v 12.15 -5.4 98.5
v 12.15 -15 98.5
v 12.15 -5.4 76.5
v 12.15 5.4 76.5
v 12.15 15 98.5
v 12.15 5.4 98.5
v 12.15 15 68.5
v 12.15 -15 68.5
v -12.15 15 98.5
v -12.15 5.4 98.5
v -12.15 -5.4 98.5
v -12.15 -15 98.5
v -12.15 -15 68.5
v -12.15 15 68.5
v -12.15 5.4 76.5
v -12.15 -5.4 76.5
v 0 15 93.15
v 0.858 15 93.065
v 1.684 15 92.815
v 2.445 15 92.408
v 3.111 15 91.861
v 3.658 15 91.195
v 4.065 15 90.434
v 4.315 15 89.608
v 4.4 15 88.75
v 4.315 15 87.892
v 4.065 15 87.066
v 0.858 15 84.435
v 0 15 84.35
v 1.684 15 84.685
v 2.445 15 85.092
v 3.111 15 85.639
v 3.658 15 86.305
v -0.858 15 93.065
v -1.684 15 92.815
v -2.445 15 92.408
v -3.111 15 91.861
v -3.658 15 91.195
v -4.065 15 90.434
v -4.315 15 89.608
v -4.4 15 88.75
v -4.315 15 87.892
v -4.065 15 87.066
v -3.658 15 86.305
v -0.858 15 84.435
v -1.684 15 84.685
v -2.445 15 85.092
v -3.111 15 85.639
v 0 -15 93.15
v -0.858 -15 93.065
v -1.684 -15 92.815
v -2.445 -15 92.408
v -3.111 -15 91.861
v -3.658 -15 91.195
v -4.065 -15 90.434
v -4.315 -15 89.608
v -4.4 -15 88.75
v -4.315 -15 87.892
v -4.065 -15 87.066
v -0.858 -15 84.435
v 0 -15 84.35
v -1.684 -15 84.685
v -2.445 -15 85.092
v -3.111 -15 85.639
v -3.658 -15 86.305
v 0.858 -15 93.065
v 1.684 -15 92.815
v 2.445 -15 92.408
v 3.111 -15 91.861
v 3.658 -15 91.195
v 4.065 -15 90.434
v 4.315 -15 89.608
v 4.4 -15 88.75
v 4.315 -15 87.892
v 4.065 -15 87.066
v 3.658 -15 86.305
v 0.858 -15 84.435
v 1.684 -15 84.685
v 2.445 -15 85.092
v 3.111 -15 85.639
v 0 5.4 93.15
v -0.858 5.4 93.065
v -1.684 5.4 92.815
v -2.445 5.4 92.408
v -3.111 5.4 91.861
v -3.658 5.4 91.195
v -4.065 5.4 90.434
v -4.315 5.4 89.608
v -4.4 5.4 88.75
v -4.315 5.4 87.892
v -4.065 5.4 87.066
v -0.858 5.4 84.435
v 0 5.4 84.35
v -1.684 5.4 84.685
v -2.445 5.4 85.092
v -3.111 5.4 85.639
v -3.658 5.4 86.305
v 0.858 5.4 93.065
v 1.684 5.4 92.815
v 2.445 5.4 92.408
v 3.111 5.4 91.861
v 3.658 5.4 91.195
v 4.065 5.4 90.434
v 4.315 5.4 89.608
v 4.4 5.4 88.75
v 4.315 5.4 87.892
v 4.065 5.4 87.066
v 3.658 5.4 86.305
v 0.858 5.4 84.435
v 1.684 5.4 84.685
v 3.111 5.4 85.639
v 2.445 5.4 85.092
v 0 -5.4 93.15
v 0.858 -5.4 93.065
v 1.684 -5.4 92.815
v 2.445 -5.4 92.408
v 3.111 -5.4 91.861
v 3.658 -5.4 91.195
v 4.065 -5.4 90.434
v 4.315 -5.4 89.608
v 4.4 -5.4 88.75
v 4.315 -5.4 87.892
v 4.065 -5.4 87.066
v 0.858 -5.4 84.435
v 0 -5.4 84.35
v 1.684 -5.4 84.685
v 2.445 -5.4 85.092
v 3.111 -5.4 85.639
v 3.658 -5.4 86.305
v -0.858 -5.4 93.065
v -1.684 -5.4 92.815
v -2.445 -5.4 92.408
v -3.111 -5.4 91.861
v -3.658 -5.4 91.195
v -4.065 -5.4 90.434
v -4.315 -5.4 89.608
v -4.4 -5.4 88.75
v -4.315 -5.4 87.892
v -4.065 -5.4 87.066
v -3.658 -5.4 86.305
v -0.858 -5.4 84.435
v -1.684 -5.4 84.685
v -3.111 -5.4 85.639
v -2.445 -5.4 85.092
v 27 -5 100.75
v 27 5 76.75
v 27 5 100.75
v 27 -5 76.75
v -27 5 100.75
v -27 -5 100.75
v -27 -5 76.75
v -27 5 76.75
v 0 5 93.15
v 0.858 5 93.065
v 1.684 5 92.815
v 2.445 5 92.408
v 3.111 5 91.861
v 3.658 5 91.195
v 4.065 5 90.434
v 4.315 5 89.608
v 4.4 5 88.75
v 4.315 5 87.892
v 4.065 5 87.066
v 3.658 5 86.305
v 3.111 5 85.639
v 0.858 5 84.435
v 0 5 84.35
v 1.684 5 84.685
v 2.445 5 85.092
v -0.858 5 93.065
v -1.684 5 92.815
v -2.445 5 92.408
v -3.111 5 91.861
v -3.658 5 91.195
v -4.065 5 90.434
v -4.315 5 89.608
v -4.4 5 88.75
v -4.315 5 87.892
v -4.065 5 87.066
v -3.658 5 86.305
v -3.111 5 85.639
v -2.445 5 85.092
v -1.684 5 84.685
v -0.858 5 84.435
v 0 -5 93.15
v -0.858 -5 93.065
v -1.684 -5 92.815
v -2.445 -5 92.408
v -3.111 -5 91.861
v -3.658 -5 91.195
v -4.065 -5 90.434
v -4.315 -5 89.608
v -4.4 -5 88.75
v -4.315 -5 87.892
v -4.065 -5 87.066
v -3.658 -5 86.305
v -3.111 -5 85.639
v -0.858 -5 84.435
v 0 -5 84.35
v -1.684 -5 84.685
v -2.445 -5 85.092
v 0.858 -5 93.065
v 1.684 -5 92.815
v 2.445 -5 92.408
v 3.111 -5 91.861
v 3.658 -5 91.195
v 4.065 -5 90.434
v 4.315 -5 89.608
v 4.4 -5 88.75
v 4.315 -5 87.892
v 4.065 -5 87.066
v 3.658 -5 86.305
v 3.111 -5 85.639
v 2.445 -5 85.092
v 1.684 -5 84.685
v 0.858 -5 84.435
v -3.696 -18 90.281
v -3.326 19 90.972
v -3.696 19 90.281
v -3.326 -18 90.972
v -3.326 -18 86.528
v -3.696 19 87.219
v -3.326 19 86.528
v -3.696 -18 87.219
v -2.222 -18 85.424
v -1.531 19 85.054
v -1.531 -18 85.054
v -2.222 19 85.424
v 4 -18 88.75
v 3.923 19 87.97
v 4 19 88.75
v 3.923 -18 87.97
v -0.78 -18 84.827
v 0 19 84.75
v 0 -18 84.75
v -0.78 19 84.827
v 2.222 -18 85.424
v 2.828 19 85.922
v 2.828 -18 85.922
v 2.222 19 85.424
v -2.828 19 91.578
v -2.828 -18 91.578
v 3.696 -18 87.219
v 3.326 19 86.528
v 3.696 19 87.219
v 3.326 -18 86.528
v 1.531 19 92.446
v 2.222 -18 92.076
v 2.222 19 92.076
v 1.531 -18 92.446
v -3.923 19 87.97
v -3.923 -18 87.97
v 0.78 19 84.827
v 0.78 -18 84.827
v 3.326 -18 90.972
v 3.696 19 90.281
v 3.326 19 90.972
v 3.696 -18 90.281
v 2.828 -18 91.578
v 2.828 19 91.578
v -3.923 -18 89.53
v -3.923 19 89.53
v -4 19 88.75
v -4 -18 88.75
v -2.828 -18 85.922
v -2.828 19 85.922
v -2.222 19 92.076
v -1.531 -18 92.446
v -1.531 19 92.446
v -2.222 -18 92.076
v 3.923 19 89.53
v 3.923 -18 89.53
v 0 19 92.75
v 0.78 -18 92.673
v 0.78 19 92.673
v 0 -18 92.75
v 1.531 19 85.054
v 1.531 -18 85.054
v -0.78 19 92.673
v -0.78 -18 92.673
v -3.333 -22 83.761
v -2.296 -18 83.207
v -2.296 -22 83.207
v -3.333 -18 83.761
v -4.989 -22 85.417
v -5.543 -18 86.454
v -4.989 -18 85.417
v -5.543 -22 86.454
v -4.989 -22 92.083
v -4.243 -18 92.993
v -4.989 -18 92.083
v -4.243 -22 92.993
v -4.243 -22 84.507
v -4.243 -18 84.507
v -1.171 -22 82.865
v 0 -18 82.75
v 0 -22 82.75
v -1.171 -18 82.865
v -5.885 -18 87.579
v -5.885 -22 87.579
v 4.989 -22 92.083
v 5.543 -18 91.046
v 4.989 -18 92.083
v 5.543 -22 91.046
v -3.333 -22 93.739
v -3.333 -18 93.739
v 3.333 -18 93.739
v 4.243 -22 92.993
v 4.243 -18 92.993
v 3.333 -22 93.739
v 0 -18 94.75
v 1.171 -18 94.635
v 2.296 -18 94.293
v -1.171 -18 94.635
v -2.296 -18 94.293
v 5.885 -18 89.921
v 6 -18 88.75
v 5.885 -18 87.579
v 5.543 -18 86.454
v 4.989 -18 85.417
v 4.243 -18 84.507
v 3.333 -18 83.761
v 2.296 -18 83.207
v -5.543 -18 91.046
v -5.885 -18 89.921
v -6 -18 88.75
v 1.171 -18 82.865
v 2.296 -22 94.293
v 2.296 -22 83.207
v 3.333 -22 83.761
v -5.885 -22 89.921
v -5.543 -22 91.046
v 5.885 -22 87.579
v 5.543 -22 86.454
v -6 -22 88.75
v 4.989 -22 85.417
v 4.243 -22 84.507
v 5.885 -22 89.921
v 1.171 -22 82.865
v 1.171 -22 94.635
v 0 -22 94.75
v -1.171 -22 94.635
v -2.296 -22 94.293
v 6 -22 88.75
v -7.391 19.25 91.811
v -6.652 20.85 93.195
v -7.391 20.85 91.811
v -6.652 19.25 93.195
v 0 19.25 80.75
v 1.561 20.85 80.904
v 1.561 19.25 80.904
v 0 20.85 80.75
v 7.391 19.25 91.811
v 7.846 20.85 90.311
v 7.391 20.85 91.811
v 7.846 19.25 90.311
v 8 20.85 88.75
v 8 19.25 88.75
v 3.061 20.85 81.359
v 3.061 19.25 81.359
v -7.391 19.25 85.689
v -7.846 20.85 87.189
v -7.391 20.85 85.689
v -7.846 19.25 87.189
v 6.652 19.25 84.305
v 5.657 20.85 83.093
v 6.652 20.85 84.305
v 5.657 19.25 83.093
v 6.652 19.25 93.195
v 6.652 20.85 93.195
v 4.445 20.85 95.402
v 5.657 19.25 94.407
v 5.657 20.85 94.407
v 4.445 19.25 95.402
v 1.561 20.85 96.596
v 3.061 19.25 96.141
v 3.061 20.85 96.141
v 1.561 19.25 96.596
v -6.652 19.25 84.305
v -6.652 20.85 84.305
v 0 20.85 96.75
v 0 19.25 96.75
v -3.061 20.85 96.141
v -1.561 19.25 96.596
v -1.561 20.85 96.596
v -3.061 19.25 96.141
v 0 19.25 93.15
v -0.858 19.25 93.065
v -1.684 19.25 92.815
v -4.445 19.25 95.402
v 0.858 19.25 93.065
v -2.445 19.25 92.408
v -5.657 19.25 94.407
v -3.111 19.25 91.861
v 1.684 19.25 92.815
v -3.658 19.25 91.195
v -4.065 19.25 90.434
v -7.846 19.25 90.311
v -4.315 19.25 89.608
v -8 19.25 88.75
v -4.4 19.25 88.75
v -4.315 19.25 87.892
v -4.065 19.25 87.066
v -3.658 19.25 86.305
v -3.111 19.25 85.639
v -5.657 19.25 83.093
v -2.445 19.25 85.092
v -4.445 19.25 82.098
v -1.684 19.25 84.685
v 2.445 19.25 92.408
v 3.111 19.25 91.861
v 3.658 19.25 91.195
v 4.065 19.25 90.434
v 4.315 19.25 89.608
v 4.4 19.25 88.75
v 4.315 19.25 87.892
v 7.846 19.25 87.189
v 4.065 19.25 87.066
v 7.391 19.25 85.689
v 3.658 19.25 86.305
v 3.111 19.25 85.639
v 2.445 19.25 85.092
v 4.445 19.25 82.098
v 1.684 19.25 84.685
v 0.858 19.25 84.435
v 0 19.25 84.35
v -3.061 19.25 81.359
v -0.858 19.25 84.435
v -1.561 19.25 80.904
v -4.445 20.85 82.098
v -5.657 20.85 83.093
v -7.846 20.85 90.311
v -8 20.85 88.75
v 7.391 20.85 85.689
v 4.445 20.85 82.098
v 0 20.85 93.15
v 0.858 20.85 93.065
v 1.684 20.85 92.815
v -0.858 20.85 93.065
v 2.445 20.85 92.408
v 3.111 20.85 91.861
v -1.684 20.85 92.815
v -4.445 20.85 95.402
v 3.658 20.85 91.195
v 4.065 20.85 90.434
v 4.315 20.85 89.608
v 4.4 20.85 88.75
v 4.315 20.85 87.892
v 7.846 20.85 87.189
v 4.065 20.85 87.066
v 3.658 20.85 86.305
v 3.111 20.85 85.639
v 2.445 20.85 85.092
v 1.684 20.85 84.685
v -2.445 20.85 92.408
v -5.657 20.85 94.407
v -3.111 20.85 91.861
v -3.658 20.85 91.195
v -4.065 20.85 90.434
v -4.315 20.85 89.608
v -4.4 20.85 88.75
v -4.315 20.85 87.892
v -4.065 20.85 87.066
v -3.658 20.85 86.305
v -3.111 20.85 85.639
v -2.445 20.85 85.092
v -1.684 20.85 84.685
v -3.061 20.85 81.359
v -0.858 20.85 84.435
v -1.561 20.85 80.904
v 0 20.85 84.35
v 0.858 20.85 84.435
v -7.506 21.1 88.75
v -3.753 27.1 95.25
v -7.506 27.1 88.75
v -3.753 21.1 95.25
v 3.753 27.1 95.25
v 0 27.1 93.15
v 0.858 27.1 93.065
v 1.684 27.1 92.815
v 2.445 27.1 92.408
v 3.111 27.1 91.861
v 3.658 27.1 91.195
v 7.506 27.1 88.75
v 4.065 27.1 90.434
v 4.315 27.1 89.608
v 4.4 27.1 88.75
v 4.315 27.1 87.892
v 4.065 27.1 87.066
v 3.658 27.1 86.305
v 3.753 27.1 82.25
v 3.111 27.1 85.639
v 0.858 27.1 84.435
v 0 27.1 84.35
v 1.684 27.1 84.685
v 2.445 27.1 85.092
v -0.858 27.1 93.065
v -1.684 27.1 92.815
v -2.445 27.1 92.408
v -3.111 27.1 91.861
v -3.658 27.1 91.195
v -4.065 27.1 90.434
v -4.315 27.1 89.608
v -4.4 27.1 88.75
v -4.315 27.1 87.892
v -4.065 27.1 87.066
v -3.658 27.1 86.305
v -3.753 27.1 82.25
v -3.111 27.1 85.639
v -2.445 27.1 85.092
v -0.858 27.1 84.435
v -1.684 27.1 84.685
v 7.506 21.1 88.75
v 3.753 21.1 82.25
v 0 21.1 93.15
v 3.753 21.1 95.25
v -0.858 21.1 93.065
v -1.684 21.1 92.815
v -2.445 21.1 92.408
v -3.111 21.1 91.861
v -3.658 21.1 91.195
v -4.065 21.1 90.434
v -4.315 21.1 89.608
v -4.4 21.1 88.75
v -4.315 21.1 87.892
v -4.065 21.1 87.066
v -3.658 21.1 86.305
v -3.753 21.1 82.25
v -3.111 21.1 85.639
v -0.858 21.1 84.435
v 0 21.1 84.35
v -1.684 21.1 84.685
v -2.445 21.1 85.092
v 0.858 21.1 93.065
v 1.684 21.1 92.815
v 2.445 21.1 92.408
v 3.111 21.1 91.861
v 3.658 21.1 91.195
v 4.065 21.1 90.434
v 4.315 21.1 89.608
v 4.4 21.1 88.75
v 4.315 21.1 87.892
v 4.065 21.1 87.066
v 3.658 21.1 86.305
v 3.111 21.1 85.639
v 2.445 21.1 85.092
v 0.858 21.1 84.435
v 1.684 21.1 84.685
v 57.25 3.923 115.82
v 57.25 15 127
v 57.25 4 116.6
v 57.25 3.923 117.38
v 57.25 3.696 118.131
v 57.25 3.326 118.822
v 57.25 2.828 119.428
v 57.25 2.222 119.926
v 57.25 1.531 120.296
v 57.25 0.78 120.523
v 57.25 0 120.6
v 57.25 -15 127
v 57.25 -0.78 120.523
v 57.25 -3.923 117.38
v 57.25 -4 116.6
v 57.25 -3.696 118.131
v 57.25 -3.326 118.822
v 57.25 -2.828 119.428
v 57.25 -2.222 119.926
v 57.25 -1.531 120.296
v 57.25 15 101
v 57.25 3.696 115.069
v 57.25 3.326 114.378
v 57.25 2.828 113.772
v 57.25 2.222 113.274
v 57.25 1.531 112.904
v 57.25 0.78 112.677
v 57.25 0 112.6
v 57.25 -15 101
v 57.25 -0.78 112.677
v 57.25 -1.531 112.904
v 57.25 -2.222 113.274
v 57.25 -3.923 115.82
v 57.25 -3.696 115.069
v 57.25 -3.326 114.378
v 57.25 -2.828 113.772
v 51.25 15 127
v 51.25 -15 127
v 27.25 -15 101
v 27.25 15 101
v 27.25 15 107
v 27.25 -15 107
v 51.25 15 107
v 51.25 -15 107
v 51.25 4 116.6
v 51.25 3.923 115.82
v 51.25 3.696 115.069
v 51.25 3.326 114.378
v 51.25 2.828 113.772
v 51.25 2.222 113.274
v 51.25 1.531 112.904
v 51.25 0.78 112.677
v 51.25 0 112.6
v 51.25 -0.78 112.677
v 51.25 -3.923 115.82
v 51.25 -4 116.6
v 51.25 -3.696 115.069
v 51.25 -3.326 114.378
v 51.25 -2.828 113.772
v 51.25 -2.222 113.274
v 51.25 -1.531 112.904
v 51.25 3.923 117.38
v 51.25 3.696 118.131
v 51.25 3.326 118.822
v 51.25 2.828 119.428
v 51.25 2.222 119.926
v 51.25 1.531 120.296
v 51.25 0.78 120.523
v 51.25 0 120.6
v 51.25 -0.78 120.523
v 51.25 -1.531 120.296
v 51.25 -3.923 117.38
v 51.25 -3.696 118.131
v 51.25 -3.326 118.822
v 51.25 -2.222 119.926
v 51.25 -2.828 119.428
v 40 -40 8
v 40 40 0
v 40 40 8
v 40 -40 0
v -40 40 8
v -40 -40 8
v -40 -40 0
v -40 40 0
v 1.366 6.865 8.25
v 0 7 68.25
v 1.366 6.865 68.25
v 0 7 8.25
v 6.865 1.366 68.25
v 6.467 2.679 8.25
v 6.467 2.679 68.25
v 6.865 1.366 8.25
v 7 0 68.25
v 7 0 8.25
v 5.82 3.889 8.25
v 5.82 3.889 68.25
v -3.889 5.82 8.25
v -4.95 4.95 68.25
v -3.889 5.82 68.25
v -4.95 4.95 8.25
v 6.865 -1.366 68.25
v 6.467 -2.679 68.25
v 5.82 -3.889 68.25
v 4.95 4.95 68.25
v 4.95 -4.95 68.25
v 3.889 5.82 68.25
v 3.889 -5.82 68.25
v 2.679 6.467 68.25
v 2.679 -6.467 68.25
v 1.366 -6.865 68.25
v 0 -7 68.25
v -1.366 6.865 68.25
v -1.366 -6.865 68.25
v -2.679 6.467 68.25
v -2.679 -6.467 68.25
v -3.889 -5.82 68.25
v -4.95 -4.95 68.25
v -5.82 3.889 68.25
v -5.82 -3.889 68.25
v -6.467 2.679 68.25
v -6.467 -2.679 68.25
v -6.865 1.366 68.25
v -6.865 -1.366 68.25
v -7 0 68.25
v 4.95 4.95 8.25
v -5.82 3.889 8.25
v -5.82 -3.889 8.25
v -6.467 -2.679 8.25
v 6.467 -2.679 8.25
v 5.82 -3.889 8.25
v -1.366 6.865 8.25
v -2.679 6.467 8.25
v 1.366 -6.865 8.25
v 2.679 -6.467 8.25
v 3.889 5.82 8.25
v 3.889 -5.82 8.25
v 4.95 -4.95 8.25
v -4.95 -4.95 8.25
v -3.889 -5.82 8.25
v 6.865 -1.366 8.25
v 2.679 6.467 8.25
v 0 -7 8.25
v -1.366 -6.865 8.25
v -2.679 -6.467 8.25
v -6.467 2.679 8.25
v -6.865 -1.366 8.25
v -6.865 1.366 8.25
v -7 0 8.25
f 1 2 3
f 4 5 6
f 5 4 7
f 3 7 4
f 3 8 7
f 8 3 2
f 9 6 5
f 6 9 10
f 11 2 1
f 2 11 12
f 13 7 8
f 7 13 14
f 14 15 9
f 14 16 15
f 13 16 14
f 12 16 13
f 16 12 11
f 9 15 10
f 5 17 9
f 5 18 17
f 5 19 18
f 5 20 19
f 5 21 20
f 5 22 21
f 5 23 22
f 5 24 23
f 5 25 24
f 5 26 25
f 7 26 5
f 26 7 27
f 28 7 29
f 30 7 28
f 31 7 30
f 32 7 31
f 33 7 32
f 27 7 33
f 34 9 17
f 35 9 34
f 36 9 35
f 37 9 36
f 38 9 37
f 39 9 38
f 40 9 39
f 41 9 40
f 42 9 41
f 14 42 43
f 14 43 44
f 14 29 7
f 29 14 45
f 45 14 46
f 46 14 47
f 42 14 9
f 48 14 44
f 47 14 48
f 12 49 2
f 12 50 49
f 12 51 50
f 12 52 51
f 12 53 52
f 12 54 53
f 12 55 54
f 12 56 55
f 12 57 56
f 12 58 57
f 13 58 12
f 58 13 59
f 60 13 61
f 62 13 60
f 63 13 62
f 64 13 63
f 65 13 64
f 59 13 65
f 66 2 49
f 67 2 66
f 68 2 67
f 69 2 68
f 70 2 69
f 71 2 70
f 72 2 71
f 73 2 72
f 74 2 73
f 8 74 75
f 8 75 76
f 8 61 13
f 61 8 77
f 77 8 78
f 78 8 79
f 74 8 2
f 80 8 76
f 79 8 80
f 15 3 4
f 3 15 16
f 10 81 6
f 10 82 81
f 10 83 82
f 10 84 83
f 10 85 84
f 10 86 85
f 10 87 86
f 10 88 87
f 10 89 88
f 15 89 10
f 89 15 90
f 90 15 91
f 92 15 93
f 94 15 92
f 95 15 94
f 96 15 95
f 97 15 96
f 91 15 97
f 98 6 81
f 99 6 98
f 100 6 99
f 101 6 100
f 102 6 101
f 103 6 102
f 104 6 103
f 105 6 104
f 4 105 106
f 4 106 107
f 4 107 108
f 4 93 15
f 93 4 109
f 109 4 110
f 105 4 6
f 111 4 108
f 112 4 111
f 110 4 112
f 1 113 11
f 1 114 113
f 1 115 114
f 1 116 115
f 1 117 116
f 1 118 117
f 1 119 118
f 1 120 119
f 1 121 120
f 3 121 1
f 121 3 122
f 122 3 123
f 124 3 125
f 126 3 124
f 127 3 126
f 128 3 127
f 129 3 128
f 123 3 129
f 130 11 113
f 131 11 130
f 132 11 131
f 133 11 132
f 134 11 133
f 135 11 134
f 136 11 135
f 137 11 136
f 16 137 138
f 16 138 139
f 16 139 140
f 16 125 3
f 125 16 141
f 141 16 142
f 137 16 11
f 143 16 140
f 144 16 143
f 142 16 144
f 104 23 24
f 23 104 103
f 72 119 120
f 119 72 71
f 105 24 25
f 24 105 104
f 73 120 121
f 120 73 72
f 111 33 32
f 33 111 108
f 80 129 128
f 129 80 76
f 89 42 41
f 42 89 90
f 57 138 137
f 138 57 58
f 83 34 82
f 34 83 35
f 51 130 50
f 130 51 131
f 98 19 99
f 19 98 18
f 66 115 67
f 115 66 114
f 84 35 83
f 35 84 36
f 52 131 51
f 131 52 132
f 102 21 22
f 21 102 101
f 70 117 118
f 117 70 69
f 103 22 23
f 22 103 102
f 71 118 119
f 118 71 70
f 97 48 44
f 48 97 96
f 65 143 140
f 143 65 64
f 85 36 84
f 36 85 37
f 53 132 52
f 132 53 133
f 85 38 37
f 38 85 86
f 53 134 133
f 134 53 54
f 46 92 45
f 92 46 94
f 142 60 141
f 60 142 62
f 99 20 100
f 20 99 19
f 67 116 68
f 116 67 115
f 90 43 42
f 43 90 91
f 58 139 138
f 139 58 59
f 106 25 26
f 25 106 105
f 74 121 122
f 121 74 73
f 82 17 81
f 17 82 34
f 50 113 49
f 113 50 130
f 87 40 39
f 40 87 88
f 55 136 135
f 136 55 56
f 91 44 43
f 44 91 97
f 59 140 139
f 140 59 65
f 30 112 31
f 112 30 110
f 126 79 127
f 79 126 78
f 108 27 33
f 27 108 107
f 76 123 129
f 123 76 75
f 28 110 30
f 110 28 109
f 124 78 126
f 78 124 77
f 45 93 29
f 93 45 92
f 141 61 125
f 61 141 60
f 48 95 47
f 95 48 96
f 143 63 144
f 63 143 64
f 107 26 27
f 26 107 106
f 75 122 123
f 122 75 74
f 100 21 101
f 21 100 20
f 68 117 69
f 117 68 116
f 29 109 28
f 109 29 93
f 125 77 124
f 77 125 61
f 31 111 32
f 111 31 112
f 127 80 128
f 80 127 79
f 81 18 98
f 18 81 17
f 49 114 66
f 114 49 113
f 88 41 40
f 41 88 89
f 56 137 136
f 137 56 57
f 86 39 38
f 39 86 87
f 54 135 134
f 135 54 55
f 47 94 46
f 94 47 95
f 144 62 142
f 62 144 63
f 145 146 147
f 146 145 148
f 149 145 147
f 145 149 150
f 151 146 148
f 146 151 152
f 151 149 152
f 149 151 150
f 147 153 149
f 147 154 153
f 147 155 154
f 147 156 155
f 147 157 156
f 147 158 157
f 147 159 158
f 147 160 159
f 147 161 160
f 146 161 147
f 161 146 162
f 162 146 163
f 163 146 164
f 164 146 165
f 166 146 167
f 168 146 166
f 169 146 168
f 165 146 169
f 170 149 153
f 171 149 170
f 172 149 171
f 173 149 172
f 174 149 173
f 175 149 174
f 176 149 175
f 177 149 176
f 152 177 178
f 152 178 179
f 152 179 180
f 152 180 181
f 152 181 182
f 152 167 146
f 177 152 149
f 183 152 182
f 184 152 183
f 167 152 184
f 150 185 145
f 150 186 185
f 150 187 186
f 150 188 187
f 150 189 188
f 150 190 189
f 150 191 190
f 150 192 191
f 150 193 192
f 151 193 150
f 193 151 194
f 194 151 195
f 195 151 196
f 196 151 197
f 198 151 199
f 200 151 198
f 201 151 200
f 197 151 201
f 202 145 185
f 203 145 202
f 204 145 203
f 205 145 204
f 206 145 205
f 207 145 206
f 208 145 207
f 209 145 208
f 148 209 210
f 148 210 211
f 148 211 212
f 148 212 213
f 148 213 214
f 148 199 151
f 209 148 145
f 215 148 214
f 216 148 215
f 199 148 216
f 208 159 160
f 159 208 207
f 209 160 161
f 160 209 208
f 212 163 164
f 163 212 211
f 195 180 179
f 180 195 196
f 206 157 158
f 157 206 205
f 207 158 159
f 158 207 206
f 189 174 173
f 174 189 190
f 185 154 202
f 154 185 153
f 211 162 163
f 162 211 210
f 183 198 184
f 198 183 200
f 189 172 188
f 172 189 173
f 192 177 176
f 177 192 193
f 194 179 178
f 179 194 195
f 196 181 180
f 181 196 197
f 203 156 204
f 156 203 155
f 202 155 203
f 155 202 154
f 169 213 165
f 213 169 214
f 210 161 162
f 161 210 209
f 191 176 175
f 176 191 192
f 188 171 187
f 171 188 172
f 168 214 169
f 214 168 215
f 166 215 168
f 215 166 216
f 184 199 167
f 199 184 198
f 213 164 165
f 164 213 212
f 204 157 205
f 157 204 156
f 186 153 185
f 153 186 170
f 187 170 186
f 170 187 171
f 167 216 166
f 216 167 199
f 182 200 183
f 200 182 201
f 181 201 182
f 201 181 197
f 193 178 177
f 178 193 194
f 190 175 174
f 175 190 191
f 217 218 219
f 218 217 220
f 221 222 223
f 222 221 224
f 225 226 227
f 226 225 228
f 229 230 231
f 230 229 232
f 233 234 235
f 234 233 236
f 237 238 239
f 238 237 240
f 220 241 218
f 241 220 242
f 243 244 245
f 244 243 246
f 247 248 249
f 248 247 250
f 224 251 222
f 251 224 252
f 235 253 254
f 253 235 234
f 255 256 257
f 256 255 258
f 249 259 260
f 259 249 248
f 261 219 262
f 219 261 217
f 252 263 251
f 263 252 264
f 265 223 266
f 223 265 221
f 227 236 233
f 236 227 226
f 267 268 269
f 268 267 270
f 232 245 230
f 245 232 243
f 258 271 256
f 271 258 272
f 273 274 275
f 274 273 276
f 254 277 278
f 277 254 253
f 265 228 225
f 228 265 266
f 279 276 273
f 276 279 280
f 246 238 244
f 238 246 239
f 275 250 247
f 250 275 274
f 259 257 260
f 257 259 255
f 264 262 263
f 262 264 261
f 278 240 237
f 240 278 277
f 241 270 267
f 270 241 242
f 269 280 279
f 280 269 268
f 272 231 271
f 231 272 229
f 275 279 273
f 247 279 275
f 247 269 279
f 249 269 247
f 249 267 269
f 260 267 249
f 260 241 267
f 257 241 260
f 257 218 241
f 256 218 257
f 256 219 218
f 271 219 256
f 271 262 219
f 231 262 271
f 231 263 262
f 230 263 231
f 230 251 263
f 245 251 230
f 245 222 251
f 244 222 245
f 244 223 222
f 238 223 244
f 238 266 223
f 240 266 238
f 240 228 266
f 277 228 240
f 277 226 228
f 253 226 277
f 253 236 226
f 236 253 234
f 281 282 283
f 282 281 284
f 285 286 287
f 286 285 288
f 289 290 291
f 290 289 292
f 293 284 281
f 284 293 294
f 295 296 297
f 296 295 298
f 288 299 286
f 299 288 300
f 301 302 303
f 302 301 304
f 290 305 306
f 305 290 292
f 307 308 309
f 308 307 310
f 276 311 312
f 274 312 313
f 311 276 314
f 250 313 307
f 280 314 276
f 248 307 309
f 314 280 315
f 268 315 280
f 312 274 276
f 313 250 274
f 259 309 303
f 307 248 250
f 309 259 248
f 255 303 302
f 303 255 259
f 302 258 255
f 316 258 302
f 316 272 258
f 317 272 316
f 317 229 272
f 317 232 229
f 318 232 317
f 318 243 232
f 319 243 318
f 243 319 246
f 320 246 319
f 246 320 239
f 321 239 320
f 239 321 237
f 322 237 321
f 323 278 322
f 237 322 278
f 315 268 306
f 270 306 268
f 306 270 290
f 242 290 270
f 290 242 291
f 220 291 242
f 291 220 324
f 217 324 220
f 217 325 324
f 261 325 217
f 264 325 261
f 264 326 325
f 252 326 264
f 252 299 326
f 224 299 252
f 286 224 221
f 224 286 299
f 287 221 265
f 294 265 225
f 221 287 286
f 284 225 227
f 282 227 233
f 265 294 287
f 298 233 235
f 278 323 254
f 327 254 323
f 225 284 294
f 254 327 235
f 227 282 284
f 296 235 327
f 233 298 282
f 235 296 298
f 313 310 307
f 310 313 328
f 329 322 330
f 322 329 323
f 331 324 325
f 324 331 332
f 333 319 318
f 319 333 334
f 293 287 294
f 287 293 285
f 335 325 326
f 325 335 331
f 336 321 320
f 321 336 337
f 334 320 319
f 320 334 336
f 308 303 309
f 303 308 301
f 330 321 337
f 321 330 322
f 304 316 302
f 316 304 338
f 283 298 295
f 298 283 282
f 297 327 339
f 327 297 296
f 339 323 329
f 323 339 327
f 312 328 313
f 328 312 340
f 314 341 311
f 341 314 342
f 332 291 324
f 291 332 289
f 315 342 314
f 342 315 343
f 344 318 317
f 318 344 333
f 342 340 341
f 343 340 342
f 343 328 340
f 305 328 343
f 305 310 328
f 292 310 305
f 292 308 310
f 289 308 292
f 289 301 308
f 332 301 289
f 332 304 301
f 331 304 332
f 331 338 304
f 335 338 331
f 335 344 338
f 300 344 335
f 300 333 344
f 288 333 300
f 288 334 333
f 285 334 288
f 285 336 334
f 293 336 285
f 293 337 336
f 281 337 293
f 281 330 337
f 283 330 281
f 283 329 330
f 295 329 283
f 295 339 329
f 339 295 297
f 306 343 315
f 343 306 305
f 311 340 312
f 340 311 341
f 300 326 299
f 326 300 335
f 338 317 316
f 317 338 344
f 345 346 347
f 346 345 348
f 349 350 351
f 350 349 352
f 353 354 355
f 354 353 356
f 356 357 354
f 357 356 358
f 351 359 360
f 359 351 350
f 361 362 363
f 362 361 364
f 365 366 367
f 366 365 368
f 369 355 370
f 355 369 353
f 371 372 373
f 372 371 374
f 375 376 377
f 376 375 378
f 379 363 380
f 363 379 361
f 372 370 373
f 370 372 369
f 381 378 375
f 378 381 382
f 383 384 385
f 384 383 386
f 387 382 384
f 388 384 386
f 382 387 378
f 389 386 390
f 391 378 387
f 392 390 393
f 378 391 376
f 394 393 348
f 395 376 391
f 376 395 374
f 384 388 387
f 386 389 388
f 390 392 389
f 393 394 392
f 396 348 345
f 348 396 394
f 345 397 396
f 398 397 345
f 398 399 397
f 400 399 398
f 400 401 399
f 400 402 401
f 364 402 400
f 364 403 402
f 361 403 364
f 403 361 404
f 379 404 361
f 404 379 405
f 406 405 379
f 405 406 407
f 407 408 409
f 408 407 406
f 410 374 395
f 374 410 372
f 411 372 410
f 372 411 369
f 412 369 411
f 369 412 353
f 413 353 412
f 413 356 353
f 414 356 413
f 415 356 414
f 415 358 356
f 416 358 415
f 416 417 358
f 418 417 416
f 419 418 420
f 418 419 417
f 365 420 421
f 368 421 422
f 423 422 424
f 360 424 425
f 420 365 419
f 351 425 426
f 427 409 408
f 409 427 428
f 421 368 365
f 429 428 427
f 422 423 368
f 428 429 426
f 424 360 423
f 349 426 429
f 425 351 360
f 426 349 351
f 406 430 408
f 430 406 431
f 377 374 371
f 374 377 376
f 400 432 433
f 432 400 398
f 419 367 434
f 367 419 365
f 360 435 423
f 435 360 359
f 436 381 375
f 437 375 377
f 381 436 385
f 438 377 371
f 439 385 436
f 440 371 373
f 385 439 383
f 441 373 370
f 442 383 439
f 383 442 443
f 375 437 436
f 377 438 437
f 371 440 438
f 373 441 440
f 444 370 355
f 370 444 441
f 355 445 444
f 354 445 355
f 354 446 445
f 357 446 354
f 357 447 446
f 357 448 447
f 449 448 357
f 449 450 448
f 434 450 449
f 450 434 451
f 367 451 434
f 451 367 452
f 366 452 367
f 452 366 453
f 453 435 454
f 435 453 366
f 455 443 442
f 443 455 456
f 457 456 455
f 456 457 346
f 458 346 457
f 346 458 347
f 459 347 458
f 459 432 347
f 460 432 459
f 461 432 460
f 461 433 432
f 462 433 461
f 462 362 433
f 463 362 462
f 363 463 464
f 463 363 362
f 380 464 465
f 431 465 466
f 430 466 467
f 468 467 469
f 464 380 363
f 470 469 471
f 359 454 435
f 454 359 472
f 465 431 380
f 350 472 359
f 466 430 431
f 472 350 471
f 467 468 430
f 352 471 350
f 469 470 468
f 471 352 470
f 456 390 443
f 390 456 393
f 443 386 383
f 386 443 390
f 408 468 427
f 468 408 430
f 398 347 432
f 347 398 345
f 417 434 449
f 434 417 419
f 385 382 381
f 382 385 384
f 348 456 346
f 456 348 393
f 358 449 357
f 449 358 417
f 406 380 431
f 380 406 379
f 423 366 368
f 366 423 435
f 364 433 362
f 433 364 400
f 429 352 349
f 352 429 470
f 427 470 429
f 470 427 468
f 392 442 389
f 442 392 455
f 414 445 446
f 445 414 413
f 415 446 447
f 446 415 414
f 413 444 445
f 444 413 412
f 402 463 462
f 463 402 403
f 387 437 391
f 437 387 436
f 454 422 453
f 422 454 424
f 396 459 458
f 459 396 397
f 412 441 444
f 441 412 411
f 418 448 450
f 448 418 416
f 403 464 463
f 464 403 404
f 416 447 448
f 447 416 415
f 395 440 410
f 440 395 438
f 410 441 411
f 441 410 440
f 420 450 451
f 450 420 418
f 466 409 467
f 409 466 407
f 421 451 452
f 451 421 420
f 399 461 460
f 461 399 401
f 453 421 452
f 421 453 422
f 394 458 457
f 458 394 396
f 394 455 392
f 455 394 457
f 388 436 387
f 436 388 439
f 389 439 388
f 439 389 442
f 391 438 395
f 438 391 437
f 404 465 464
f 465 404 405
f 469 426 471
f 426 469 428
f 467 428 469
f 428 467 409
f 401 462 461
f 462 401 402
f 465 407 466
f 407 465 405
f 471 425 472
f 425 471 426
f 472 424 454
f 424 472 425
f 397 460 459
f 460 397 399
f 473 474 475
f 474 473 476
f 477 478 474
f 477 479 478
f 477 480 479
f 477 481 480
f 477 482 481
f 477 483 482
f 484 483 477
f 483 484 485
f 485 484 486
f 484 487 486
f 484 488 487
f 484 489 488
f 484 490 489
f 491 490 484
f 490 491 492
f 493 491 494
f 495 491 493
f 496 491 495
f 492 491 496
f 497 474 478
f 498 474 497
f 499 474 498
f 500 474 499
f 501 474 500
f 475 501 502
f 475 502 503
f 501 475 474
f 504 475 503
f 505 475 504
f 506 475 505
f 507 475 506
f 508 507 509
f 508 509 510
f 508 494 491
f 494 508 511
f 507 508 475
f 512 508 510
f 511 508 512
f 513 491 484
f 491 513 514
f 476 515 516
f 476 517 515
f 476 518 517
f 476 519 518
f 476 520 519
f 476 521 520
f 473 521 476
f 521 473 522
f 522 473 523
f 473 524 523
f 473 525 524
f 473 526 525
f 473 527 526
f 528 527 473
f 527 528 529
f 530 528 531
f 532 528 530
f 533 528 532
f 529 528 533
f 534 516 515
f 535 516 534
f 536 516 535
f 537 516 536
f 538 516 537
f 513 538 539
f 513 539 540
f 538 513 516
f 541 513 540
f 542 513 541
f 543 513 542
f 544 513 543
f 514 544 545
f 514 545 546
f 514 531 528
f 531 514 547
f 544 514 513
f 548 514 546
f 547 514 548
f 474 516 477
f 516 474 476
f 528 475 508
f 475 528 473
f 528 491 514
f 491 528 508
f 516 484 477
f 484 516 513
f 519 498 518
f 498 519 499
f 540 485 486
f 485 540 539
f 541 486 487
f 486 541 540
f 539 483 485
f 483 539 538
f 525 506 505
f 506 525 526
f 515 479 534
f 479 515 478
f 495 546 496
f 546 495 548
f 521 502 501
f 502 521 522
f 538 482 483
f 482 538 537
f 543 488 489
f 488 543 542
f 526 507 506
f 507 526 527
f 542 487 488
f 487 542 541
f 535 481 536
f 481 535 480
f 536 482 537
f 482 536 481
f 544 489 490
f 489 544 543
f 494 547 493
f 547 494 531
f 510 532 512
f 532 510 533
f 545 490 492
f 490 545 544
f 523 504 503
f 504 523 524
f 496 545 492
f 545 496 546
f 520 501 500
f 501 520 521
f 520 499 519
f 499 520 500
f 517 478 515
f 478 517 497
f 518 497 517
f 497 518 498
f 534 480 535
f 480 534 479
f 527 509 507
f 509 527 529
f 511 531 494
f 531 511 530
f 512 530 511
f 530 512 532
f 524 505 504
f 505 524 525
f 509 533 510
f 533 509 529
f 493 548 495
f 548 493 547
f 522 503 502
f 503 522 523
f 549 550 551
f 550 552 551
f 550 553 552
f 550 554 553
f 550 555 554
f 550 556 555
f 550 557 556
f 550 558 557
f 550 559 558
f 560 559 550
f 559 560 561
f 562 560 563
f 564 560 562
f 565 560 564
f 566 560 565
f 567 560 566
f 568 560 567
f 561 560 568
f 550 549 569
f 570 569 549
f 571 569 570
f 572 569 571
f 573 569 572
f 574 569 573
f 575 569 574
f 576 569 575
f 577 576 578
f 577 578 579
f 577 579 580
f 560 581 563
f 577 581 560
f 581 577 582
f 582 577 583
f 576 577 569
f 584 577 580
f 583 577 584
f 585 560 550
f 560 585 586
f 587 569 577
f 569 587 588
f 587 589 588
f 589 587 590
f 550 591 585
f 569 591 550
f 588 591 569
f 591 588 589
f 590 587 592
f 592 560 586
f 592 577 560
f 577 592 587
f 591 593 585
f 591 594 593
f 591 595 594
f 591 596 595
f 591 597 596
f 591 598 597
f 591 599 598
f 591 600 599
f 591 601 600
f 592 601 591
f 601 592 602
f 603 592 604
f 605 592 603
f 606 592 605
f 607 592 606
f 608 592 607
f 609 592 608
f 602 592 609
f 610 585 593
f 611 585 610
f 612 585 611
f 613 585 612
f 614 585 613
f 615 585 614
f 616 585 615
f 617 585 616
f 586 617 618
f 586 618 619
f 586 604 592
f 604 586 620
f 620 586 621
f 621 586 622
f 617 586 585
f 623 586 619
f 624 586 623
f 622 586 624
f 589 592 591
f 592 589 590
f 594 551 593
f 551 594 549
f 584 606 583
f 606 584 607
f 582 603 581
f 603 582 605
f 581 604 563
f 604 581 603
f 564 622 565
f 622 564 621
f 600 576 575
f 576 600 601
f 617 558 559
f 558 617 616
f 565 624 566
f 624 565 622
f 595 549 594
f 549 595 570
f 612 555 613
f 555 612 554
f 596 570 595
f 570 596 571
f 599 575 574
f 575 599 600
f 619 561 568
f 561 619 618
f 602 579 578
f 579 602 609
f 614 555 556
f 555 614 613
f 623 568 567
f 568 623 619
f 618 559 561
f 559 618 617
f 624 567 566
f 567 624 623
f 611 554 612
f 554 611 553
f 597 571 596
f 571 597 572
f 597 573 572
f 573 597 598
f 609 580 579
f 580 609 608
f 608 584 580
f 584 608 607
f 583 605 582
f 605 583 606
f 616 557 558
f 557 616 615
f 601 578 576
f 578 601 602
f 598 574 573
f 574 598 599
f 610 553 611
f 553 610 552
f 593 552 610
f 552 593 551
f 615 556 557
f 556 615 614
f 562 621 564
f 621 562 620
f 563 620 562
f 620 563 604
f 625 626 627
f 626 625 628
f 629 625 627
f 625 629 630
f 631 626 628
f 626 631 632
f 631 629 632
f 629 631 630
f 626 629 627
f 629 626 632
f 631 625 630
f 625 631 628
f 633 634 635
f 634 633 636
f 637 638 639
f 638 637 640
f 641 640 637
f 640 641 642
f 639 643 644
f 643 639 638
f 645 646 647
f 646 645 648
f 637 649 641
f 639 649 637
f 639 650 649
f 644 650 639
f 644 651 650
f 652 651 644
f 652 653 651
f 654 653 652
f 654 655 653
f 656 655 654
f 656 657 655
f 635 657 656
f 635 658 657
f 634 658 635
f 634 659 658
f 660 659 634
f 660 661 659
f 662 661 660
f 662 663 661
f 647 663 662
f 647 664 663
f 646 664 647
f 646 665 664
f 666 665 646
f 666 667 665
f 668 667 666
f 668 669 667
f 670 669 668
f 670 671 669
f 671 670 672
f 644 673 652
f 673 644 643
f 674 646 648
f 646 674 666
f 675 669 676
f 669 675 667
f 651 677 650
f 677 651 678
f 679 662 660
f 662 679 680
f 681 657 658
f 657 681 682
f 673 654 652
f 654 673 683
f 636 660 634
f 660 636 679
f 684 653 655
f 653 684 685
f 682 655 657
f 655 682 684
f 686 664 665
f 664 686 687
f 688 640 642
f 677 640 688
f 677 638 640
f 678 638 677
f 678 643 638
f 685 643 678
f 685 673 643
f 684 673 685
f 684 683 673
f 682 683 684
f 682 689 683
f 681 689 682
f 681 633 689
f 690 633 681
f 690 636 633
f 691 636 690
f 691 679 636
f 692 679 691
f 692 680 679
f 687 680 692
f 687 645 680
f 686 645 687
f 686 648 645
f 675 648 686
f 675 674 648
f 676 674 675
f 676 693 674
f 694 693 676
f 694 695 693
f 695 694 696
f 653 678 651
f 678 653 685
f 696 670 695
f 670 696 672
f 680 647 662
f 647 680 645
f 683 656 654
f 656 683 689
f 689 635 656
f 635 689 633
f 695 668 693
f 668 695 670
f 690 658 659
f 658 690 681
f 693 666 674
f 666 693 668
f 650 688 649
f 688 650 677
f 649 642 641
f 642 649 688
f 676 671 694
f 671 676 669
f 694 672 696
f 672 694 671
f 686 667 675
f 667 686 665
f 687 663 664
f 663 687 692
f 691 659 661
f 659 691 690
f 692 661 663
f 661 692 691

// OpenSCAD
$fn = 32;

// ------------------------------------------------------------------------
// Lamp arm: column d14 x 60 mm, arm 54 mm
// Every part is its own module, assembly() places every instance.
// ------------------------------------------------------------------------

// --- part 1 ---
module lamp_base() {
  difference() {
    translate([-40, -40, 0]) cube([80, 80, 8]);
  }
}

// --- part 2 ---
module lamp_column() {
  cylinder(h = 60, d = 14);
}

// --- part 3 ---
module head_fork() {
  difference() {
    translate([-12.15, -15, 0]) cube([24.3, 30, 30]);
    translate([-13.15, -5.4, 8]) cube([26.3, 10.8, 23]);
    translate([0, 0, 20.25]) rotate([90, 0, 0]) cylinder(h = 32, d = 8.8, center = true);
  }
}

// --- part 4 ---
module lamp_arm() {
  difference() {
    translate([-27, -5, 0]) cube([54, 10, 24]);
    translate([0, 0, 12]) rotate([90, 0, 0]) cylinder(h = 12, d = 8.8, center = true);
  }
}

// --- part 5 ---
module arm_pin() {
  rotate([0, 90, 0]) cylinder(h = 38, d = 8, center = true);
  translate([-22, 0, 0]) rotate([0, 90, 0]) cylinder(h = 4, d = 12);
}

// --- part 6 ---
module arm_washer() {
  difference() {
      translate([0, 0, 0]) cylinder(h = 1.6, d = 16);
      translate([0, 0, -1]) cylinder(h = 3.6, d = 8.8);
    }
}

// --- part 7 ---
module arm_nut() {
  difference() {
    linear_extrude(height = 6) polygon(points = [[7.506, 0], [3.753, 6.5], [-3.753, 6.5], [-7.506, 0], [-3.753, -6.5], [3.753, -6.5]]);
    translate([0, 0, -1]) cylinder(h = 8, d = 8.8);
  }
}

// --- part 8 ---
module shade_bracket() {
  difference() {
    translate([-15, -15, 0]) cube([30, 30, 26]);
    translate([-16, -16, 6]) cube([25, 32, 21]);
    translate([12, 0, 15.6]) rotate([0, 90, 0]) cylinder(h = 8, d = 8, center = true);
  }
}

// --- assembly ---
module assembly() {
  color([0.80, 0.24, 0.20]) translate([0, 0, 0]) rotate([0, 0, 0]) lamp_base();
  color([0.20, 0.45, 0.75]) translate([0, 0, 8.25]) rotate([0, 0, 0]) lamp_column();
  color([0.25, 0.62, 0.32]) translate([0, 0, 68.5]) rotate([0, 0, 0]) head_fork();
  color([0.92, 0.70, 0.18]) translate([0, 0, 76.75]) rotate([0, 0, 0]) lamp_arm();
  color([0.58, 0.35, 0.70]) translate([0, 0, 88.75]) rotate([0, 0, 90]) arm_pin();
  color([0.16, 0.66, 0.66]) translate([0, 20.85, 88.75]) rotate([90, 0, 0]) arm_washer();
  color([0.85, 0.48, 0.18]) translate([0, 27.1, 88.75]) rotate([90, 0, 0]) arm_nut();
  color([0.55, 0.60, 0.65]) translate([42.25, 0, 101]) rotate([0, 0, 0]) shade_bracket();
}

assembly();
